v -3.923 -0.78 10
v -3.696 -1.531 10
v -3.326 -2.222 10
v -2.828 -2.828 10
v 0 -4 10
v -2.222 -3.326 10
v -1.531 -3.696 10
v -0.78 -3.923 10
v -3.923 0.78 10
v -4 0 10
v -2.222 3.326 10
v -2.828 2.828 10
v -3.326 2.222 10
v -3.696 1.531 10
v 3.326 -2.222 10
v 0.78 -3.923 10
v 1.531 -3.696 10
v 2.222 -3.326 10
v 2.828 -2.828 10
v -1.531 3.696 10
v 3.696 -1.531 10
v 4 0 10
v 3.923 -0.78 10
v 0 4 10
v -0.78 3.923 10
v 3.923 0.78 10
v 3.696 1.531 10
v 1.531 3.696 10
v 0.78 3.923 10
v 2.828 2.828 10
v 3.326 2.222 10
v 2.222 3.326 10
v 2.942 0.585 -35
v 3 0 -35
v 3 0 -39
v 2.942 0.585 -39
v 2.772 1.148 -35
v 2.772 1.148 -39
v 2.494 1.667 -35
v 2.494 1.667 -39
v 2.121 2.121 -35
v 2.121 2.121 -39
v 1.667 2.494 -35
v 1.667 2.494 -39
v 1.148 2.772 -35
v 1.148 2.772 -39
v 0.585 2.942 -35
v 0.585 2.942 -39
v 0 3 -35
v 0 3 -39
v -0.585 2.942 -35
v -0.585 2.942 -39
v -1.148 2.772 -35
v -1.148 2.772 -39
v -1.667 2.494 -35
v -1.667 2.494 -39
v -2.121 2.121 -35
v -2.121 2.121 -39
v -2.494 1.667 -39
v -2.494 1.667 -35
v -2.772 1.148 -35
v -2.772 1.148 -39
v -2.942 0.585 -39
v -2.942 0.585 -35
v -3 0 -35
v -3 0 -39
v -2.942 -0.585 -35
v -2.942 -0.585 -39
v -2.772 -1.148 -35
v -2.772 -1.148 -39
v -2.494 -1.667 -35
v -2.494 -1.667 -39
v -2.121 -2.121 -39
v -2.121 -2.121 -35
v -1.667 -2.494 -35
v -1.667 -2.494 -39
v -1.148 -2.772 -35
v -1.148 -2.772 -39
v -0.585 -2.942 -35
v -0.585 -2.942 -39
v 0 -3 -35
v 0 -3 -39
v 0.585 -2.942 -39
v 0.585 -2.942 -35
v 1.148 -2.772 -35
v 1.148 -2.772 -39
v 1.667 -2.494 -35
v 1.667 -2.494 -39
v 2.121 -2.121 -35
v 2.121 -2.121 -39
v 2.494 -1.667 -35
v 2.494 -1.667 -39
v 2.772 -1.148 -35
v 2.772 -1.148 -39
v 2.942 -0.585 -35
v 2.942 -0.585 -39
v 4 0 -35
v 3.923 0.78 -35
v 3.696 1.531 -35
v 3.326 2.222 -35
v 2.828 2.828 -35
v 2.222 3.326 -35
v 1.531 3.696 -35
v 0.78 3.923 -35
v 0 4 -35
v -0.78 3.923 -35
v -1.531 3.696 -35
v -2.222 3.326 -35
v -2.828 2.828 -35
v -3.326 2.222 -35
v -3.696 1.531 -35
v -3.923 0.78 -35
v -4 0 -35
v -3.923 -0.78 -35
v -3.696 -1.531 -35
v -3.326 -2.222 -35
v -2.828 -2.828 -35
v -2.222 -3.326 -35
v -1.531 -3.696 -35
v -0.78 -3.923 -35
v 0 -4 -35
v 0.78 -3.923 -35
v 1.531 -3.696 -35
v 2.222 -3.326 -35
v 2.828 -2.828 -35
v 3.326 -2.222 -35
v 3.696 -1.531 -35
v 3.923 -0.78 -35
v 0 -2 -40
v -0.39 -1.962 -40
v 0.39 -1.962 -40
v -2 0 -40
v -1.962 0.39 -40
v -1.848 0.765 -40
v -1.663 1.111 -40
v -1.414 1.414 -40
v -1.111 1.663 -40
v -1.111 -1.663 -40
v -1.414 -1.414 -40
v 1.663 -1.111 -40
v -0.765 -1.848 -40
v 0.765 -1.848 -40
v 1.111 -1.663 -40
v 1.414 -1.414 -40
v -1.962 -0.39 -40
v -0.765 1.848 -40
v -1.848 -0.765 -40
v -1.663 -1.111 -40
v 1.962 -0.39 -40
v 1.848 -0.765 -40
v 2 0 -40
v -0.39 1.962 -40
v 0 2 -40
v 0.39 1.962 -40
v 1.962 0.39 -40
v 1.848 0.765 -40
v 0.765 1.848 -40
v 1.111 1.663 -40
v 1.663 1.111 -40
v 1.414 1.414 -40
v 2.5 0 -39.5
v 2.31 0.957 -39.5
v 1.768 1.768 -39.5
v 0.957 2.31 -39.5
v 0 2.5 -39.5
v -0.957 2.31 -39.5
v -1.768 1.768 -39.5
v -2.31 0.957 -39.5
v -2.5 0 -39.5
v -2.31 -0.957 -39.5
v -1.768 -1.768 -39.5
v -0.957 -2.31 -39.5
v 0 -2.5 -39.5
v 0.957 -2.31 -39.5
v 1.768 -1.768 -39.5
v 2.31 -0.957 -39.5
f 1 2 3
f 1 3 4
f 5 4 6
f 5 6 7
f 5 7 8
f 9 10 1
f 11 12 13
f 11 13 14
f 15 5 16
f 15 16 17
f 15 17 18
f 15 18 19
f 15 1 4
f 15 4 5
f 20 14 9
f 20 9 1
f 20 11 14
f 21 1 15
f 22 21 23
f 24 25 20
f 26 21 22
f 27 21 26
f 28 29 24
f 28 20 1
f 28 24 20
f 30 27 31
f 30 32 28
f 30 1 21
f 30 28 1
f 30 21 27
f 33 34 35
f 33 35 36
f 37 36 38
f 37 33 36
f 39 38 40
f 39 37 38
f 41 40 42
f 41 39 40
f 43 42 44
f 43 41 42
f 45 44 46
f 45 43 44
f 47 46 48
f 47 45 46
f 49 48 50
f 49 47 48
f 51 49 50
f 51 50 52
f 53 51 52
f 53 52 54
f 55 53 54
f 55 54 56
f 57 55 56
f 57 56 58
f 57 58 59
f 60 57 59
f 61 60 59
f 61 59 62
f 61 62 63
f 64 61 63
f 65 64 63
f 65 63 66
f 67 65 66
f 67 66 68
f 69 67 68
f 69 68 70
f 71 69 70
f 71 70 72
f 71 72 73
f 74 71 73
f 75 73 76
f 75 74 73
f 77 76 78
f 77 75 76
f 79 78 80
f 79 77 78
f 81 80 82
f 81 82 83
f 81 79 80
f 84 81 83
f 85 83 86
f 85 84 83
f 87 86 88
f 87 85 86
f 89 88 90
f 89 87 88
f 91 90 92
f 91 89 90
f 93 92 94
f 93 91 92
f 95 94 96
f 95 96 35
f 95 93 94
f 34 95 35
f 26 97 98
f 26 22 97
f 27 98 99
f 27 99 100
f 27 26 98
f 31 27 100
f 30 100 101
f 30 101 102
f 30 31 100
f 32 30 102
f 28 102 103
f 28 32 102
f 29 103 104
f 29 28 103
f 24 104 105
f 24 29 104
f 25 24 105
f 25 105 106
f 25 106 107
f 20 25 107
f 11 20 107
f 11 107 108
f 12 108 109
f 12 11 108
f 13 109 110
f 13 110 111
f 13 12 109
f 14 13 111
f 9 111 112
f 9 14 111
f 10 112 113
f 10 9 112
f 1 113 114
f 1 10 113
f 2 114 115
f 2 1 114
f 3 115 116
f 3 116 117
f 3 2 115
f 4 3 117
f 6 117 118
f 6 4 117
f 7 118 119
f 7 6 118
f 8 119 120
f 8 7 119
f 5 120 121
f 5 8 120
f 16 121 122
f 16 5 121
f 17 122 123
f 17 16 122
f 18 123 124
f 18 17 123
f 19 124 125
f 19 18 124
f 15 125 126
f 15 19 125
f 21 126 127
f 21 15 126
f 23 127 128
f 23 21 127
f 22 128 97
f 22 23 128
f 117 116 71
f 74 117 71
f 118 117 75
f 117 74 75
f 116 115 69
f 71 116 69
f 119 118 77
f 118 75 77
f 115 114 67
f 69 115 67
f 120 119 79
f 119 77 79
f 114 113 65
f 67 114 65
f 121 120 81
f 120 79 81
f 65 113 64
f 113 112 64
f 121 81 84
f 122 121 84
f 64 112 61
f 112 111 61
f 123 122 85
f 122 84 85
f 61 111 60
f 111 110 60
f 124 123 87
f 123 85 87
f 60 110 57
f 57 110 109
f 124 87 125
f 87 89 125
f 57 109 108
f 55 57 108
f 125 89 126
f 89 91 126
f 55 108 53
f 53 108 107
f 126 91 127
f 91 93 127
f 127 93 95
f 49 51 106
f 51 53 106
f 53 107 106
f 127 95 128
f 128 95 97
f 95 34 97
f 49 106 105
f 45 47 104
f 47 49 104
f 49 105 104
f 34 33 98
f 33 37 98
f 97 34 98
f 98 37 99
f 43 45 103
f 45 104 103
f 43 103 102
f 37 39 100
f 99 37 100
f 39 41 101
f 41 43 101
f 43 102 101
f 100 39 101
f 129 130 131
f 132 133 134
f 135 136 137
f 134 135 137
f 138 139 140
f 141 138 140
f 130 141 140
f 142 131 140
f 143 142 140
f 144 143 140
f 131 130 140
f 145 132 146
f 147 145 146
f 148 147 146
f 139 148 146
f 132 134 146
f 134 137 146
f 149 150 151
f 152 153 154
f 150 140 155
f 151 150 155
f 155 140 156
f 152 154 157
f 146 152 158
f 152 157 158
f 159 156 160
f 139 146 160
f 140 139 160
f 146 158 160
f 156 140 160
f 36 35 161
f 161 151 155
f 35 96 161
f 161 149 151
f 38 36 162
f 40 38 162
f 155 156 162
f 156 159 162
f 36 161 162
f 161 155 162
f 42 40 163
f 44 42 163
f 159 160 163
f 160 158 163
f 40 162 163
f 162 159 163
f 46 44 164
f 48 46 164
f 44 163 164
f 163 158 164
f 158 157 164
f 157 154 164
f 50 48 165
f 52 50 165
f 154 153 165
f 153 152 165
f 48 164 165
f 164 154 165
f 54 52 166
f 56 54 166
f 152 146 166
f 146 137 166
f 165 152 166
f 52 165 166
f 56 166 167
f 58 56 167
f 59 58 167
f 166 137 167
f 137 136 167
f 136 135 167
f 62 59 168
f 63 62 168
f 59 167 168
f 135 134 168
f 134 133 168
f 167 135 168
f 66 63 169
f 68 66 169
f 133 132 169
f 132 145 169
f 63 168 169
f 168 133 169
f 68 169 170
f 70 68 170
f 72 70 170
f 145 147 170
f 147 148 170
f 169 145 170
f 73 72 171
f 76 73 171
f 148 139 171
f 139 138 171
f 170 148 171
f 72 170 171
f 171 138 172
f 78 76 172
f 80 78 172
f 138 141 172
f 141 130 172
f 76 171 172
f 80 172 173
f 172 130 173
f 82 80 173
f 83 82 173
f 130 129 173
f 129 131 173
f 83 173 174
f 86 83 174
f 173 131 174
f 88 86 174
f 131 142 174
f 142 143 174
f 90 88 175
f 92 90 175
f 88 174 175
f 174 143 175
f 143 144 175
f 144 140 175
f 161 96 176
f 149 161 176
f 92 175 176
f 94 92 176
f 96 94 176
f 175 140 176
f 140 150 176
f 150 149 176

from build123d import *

# Parameters (mm, degrees)
F0_R          = 4
F0_R_2        = 3
F1_DEPTH      = 35
F1_DEPTH_BACK = 10
F2_DEPTH      = 40
F3_SIZE       = 1


with BuildPart() as f1:
    # F0 (on Top) → F1 (new body, two sides)
    with BuildSketch(Plane.XY) as f1_sk:
        Circle(F0_R)
        Circle(F0_R_2, mode=Mode.SUBTRACT)
        Circle(F0_R_2)
    extrude(amount=-F1_DEPTH)
    extrude(f1_sk.sketch, amount=F1_DEPTH_BACK)

    # F0 (on Top) → F2 (join)
    with BuildSketch(Plane.XY):
        Circle(F0_R_2)
    extrude(amount=-F2_DEPTH)

    # F3
    f3_edges = [f1.edges().sort_by_distance(p)[0] for p in [
        (-3, 0, -40),
    ]]
    chamfer(f3_edges, length=F3_SIZE)


solid = f1.part
